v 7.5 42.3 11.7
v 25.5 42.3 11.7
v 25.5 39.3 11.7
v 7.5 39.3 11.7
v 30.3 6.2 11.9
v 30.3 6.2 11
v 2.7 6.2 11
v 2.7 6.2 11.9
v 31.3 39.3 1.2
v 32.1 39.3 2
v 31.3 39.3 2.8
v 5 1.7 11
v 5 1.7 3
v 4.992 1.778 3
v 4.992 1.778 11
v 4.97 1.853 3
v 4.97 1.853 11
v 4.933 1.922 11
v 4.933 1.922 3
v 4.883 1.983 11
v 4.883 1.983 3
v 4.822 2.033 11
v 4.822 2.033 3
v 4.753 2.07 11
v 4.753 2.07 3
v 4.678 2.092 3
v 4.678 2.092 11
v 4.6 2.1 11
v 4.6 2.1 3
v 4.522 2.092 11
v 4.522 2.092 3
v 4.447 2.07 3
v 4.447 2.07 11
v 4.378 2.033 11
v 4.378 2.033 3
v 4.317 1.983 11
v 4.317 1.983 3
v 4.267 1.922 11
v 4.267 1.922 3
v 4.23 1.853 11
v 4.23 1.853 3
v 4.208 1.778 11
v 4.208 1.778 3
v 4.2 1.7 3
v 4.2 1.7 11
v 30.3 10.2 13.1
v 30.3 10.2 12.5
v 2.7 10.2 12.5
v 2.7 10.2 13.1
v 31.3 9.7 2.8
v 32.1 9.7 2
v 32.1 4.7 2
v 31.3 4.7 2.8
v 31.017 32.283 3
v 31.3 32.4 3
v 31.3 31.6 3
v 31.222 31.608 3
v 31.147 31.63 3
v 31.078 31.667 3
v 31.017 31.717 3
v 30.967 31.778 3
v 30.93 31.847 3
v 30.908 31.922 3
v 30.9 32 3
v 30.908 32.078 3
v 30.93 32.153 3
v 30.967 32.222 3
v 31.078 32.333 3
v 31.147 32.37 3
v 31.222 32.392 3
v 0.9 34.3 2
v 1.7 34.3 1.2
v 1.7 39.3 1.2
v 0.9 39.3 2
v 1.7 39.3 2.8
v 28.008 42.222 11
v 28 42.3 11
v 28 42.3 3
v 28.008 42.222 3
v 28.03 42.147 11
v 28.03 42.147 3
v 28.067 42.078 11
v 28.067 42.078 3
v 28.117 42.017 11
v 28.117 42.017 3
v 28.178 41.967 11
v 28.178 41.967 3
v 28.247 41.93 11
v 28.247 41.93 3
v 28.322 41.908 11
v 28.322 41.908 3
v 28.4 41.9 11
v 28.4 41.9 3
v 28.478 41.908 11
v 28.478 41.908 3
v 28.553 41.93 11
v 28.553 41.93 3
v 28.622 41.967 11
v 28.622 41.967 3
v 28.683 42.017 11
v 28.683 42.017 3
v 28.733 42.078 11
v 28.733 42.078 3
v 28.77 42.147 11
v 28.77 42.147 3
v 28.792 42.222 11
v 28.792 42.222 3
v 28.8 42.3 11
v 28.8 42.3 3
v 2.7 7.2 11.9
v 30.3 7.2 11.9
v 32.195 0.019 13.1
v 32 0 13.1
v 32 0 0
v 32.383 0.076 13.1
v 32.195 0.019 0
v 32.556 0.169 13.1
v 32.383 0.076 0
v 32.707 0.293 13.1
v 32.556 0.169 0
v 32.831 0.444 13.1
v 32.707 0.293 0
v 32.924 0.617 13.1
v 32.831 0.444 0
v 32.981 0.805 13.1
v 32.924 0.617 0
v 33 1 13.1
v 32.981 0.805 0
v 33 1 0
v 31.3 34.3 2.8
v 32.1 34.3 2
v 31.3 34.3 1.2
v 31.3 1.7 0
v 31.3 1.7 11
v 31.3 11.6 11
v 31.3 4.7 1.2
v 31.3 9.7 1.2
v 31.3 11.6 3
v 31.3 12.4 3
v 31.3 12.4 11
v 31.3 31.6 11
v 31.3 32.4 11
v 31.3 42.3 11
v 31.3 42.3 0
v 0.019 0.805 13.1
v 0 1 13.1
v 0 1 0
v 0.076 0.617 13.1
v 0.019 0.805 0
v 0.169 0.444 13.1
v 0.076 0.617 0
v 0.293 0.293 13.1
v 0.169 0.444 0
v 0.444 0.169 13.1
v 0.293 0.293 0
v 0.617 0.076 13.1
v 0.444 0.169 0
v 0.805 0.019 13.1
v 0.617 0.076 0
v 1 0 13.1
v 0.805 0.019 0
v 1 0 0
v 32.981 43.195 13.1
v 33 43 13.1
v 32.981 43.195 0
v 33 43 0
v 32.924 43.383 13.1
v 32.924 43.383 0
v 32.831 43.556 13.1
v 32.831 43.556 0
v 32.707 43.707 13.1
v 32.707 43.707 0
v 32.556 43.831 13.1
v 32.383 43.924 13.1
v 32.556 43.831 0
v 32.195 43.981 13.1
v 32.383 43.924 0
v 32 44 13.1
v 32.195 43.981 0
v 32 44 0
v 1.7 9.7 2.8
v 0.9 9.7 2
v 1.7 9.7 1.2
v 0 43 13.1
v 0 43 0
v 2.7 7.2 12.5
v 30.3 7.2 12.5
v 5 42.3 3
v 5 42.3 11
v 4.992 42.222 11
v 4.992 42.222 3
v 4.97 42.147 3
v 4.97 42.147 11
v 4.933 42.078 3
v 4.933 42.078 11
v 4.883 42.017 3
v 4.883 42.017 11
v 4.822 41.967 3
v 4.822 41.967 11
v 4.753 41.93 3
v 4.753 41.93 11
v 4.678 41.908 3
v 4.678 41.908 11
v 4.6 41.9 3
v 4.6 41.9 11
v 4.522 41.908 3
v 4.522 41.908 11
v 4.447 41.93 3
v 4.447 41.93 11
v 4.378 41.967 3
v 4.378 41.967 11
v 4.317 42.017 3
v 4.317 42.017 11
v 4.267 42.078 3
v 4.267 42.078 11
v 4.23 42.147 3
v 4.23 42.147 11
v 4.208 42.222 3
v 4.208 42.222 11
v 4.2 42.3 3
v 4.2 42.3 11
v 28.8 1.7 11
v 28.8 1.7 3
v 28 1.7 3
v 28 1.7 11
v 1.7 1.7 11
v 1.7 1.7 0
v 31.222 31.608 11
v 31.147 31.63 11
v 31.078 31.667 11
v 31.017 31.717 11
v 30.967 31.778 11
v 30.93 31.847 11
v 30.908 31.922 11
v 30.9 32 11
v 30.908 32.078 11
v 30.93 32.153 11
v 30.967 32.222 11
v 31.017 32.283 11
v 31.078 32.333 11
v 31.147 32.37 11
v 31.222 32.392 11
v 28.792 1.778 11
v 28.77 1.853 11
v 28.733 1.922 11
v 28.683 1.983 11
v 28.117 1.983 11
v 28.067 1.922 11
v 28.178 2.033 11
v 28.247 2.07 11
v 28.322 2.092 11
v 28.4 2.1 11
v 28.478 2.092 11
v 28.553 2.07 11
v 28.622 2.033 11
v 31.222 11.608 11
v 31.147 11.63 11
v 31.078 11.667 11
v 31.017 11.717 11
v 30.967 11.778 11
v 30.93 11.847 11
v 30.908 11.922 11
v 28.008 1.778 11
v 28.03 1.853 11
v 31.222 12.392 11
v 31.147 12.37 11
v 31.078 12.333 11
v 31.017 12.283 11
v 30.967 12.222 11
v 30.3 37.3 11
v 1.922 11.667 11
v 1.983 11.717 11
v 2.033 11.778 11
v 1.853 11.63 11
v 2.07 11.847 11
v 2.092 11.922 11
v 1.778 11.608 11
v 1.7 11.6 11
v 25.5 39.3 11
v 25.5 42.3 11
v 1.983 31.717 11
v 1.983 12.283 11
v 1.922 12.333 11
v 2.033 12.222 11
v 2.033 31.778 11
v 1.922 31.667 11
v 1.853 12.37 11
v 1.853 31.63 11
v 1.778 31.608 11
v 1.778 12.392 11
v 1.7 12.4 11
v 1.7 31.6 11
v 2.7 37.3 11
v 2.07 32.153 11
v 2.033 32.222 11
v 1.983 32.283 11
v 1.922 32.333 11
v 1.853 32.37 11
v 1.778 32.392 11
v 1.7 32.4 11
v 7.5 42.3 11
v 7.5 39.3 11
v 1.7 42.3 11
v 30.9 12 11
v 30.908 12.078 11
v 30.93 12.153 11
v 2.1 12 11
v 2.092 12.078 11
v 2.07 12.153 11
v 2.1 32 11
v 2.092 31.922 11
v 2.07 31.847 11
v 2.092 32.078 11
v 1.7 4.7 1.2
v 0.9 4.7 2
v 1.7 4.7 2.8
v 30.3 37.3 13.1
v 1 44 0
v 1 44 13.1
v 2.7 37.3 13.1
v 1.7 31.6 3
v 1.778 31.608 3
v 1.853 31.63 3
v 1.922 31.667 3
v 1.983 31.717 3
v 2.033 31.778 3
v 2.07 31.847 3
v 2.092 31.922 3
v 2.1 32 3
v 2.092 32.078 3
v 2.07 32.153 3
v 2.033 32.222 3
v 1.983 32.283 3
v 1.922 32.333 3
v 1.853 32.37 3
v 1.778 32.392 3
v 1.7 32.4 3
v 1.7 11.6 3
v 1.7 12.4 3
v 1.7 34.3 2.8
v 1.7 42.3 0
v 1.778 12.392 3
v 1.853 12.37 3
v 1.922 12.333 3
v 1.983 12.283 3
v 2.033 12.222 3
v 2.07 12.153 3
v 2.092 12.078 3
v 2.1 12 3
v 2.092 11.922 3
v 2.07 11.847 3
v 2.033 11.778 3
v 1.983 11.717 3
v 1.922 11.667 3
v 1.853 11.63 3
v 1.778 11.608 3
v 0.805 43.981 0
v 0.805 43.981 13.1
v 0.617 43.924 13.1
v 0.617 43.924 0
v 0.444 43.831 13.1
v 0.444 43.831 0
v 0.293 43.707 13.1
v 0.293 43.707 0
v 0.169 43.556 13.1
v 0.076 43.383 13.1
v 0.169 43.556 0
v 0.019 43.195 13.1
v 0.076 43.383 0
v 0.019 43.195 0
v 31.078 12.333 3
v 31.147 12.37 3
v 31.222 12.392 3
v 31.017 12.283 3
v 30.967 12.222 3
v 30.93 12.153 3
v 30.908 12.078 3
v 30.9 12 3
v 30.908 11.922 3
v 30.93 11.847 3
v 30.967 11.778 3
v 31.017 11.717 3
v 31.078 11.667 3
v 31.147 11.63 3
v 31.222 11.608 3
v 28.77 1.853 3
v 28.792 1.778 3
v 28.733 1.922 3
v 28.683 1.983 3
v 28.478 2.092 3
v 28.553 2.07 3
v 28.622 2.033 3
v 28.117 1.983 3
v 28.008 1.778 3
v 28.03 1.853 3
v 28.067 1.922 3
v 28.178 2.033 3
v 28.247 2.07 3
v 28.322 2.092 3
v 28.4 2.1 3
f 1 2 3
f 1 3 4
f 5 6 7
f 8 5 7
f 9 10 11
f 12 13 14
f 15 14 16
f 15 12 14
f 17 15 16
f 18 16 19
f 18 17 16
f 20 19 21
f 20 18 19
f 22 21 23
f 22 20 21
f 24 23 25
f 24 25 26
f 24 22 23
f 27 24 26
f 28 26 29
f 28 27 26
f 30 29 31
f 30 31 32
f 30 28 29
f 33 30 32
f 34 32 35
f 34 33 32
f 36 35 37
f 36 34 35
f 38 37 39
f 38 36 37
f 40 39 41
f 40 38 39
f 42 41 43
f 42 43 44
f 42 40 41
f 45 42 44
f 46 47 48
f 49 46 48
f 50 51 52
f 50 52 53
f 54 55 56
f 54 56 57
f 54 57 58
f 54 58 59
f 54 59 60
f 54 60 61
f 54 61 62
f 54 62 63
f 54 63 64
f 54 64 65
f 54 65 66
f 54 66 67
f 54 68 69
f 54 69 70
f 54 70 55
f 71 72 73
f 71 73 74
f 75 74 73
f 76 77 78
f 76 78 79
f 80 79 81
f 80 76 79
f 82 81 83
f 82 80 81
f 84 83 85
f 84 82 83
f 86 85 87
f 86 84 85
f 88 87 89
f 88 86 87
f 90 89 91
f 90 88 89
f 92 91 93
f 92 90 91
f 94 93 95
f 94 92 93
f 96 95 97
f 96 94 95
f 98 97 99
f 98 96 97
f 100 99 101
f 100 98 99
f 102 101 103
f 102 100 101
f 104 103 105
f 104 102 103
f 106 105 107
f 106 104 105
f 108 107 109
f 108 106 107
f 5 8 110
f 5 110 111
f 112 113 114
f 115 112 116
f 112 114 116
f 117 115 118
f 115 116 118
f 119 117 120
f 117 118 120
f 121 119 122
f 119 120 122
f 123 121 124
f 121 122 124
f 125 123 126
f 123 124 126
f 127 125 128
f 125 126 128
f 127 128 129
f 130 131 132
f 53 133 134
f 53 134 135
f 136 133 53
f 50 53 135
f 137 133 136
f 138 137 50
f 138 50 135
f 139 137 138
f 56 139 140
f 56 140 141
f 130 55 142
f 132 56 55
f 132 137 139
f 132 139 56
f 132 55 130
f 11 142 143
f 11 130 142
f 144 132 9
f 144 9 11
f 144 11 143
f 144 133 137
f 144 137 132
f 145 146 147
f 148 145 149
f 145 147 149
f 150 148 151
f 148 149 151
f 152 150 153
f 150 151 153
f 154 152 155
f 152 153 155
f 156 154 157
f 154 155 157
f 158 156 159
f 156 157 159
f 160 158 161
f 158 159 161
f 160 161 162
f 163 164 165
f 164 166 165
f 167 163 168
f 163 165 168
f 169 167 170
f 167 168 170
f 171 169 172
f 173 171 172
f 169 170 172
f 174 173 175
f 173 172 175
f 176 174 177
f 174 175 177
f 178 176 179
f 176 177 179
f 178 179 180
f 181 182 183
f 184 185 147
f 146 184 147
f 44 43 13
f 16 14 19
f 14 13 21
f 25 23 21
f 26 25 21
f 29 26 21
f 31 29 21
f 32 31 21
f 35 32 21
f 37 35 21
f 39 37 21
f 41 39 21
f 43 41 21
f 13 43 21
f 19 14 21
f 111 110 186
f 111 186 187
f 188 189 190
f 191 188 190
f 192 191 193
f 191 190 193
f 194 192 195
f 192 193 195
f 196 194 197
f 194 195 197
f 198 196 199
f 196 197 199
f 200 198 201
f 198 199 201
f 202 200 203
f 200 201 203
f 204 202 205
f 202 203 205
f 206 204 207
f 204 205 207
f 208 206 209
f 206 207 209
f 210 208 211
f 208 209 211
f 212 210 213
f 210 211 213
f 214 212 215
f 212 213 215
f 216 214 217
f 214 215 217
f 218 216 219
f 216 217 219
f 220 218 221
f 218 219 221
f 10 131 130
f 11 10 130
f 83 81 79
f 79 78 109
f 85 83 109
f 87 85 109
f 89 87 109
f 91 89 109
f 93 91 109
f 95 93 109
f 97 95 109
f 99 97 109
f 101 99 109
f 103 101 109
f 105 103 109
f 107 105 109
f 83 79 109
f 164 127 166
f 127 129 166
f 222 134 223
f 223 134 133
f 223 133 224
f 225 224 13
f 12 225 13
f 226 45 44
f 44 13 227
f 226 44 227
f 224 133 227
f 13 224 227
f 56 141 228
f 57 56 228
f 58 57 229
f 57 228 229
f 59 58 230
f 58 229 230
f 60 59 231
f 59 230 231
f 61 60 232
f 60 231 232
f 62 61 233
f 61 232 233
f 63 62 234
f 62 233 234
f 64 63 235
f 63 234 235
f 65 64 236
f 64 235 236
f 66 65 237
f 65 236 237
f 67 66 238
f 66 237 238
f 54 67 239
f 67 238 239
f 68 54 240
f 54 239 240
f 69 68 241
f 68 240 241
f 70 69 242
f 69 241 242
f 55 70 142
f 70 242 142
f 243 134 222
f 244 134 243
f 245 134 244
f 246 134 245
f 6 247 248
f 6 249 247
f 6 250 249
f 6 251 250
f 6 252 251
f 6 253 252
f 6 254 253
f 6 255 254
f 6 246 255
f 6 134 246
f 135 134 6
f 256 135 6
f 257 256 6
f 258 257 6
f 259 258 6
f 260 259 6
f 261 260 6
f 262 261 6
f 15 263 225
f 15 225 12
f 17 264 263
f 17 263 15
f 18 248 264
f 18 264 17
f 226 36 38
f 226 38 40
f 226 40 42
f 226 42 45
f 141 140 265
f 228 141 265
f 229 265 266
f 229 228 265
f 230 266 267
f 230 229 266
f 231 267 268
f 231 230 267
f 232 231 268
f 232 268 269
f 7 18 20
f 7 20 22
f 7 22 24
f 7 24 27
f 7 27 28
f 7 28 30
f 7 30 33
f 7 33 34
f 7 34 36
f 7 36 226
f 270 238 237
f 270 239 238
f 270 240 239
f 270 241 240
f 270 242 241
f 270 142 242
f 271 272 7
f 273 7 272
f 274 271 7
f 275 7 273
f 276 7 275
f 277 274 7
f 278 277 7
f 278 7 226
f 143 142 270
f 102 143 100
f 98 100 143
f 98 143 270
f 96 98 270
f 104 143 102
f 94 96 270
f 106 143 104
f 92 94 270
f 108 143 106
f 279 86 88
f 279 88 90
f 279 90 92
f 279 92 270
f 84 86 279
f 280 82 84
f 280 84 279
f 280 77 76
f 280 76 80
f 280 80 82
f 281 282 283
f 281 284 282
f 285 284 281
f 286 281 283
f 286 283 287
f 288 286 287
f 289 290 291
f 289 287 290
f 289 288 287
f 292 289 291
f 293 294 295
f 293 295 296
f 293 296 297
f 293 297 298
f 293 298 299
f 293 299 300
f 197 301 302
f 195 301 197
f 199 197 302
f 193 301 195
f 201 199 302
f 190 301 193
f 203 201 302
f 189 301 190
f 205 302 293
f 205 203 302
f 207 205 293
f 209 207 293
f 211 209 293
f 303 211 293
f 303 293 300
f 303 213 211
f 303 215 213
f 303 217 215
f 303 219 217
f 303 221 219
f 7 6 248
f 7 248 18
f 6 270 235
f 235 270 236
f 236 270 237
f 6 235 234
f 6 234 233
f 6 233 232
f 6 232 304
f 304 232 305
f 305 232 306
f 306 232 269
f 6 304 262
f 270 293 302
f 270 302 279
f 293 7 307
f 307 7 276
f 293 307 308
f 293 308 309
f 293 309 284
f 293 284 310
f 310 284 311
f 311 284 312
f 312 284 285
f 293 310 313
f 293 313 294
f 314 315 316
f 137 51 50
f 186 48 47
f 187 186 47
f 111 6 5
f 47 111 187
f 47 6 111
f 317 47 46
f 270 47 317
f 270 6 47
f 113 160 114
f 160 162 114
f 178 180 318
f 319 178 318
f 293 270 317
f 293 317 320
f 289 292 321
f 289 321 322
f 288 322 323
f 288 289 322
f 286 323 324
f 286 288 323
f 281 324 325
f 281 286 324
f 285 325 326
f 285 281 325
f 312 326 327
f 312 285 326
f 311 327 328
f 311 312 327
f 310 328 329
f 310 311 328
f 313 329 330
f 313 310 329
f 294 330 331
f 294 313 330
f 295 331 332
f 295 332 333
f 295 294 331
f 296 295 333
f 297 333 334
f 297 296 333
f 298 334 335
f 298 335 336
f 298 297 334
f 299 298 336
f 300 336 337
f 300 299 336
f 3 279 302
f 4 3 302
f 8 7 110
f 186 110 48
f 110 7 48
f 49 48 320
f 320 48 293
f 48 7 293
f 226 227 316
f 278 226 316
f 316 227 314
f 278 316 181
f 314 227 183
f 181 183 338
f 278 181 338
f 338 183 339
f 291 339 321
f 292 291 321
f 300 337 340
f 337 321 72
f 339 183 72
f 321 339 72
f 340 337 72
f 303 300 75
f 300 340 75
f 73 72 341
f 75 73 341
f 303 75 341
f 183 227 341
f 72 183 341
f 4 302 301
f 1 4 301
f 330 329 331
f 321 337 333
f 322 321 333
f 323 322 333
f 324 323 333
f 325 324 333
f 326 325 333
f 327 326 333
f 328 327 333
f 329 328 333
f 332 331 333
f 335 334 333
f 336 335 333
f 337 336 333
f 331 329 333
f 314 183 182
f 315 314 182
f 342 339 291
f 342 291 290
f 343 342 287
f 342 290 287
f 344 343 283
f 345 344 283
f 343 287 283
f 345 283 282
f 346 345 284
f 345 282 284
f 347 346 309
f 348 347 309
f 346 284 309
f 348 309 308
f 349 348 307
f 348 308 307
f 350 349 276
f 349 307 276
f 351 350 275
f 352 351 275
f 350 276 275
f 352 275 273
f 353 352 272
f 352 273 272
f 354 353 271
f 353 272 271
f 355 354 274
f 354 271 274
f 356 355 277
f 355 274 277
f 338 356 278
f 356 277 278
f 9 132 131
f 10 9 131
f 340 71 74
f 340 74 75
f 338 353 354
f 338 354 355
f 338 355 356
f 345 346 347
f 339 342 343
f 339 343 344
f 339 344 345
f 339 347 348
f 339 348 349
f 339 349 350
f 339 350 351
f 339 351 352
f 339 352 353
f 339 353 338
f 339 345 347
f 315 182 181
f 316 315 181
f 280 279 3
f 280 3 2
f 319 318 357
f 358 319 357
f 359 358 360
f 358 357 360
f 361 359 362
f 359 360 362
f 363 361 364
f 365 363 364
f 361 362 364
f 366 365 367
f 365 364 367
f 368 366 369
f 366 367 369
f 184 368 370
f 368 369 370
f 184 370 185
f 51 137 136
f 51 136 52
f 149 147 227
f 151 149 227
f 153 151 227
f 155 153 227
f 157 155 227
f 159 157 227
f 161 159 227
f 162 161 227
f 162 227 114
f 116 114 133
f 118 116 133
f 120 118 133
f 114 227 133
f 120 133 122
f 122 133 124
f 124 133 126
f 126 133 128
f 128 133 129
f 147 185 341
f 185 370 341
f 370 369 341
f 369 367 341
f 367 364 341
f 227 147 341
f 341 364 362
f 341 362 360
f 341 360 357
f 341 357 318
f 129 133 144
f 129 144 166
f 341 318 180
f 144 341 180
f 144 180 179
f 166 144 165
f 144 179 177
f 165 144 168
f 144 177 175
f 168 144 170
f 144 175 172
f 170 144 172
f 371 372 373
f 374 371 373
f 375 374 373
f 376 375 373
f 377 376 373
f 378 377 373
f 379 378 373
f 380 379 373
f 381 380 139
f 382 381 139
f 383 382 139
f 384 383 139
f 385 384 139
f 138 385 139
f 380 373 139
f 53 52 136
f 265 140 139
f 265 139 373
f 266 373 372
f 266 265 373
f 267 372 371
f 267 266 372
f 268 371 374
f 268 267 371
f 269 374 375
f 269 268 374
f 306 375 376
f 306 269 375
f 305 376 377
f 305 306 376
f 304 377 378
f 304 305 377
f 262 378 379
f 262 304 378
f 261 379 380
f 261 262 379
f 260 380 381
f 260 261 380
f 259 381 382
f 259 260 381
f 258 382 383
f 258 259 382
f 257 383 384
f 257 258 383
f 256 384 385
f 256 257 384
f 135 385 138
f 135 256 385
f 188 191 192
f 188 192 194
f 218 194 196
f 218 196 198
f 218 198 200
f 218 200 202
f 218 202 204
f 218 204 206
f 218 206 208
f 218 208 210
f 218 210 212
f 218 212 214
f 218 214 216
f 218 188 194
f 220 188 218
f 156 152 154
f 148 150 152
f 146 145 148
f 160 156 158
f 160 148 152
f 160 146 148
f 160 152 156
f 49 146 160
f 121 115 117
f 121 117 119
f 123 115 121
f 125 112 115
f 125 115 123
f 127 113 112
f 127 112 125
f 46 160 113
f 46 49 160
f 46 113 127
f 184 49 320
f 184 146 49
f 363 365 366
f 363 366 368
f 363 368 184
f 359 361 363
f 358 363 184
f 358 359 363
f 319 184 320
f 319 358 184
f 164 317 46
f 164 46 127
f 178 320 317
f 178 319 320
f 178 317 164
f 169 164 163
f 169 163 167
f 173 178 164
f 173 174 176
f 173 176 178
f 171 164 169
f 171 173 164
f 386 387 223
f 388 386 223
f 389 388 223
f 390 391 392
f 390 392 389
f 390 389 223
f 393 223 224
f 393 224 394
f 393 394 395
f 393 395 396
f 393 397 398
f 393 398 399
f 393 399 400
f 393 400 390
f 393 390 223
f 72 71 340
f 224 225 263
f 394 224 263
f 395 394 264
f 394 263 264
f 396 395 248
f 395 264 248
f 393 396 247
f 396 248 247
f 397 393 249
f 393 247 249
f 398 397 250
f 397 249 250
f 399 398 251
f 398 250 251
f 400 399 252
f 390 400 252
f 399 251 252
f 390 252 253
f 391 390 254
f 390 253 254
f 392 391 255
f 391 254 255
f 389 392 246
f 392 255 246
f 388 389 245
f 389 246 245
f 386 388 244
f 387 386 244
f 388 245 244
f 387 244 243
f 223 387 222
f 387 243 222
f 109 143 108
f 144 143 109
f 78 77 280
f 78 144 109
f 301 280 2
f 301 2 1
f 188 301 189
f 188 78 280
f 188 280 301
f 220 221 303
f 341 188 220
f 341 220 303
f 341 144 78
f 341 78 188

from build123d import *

# Parameters (mm, degrees)
SKETCH_1_W          = 33
SKETCH_1_H          = 44
EXTRUDE_1_DEPTH     = 12.5
SKETCH_2_W          = 29.6
SKETCH_2_H          = 40.6
CUT_EXTRUDE_2_DEPTH = 11
SKETCH_3_W          = 27.6
SKETCH_3_H          = 31.1
CUT_EXTRUDE_3_DEPTH = 2.5
SKETCH_4_W          = 18
SKETCH_4_H          = 3
CUT_EXTRUDE_4_DEPTH = 0.7
FILLET_1_R          = 1
SKETCH_5_W          = 27.6
SKETCH_5_H          = 0.6
EXTRUDE_2_DEPTH     = 1
EXTRUDE_3_DEPTH     = 8
EXTRUDE_4_DEPTH     = 0.6
SKETCH_8_W          = 27.6
SKETCH_8_H          = 27.1
CUT_EXTRUDE_5_DEPTH = 1.6
CUT_EXTRUDE_6_DEPTH = 5


with BuildPart() as part:
    # 草图1 → 凸台-拉伸1 (new body)
    with BuildSketch(Plane.XY):
        with Locations((16.5, 22)):
            Rectangle(SKETCH_1_W, SKETCH_1_H)
    extrude(amount=EXTRUDE_1_DEPTH)

    # 草图2 → 切除-拉伸2 (cut)
    with BuildSketch(Plane(origin=(0, 0, 0), x_dir=(-1, 0, 0), z_dir=(0, 0, -1))):
        with Locations((-16.5, 22)):
            Rectangle(SKETCH_2_W, SKETCH_2_H)
    extrude(amount=-CUT_EXTRUDE_2_DEPTH, mode=Mode.SUBTRACT)

    # 草图3 → 切除-拉伸3 (cut, through all)
    with BuildSketch(Plane(origin=(0, 0, 11), x_dir=(-1, 0, 0), z_dir=(0, 0, -1))):
        with Locations((-16.5, 21.75)):
            Rectangle(SKETCH_3_W, SKETCH_3_H)
    extrude(amount=-CUT_EXTRUDE_3_DEPTH, mode=Mode.SUBTRACT)

    # 草图4 → 切除-拉伸4 (cut)
    with BuildSketch(Plane(origin=(0, 0, 11), x_dir=(-1, 0, 0), z_dir=(0, 0, -1))):
        with Locations((-16.5, 40.8)):
            Rectangle(SKETCH_4_W, SKETCH_4_H)
    extrude(amount=-CUT_EXTRUDE_4_DEPTH, mode=Mode.SUBTRACT)

    # 圆角1
    fillet_1_edges = [part.edges().sort_by_distance(p)[0] for p in [
        (0, 44, 6.25),
        (33, 44, 6.25),
        (33, 0, 6.25),
        (0, 0, 6.25),
    ]]
    fillet(fillet_1_edges, radius=FILLET_1_R)

    # 草图5 → 凸台-拉伸2 (add)
    with BuildSketch(Plane(origin=(0, 6.2, 0), x_dir=(1, 0, 0), z_dir=(0, 1, 0))):
        with Locations((16.5, -12.2)):
            Rectangle(SKETCH_5_W, SKETCH_5_H)
    extrude(amount=EXTRUDE_2_DEPTH)

    # 草图6 → 凸台-拉伸3 (add)
    with BuildSketch(Plane(origin=(0, 0, 11), x_dir=(-1, 0, 0), z_dir=(0, 0, -1))):
        with BuildLine():
            Line((-31.3, 11.6), (-31.3, 12.4))
            ThreePointArc((-31.3, 12.4), (-30.9, 12), (-31.3, 11.6))
        make_face()
        with BuildLine():
            Line((-31.3, 32.4), (-31.3, 31.6))
            ThreePointArc((-31.3, 31.6), (-30.9, 32), (-31.3, 32.4))
        make_face()
        with BuildLine():
            Line((-28.8, 42.3), (-28, 42.3))
            ThreePointArc((-28, 42.3), (-28.4, 41.9), (-28.8, 42.3))
        make_face()
        with BuildLine():
            Line((-28.8, 1.7), (-28, 1.7))
            ThreePointArc((-28, 1.7), (-28.4, 2.1), (-28.8, 1.7))
        make_face()
        with BuildLine():
            Line((-4.2, 1.7), (-5, 1.7))
            ThreePointArc((-5, 1.7), (-4.6, 2.1), (-4.2, 1.7))
        make_face()
        with BuildLine():
            Line((-4.2, 42.3), (-5, 42.3))
            ThreePointArc((-5, 42.3), (-4.6, 41.9), (-4.2, 42.3))
        make_face()
        with BuildLine():
            Line((-1.7, 32.4), (-1.7, 31.6))
            ThreePointArc((-1.7, 31.6), (-2.1, 32), (-1.7, 32.4))
        make_face()
        with BuildLine():
            Line((-1.7, 11.6), (-1.7, 12.4))
            ThreePointArc((-1.7, 12.4), (-2.1, 12), (-1.7, 11.6))
        make_face()
    extrude(amount=EXTRUDE_3_DEPTH)

    # 草图7 → 凸台-拉伸4 (add)
    with BuildSketch(Plane.XY.offset(12.5)):
        with BuildLine():
            Line((0, 43), (0, 1))
            ThreePointArc((0, 1), (0.292893219, 0.292893219), (1, 0))
            Line((1, 0), (32, 0))
            ThreePointArc((32, 0), (32.707106781, 0.292893219), (33, 1))
            Line((33, 1), (33, 43))
            ThreePointArc((33, 43), (32.707106781, 43.707106781), (32, 44))
            Line((32, 44), (1, 44))
            ThreePointArc((1, 44), (0.292893219, 43.707106781), (0, 43))
        make_face()
    extrude(amount=EXTRUDE_4_DEPTH)

    # 草图8 → 切除-拉伸5 (cut, through all)
    with BuildSketch(Plane(origin=(0, 0, 12.5), x_dir=(-1, 0, 0), z_dir=(0, 0, -1))):
        with Locations((-16.5, 23.75)):
            Rectangle(SKETCH_8_W, SKETCH_8_H)
    extrude(amount=-CUT_EXTRUDE_5_DEPTH, mode=Mode.SUBTRACT)

    # 草图9 → 切除-拉伸6 (cut)
    with BuildSketch(Plane(origin=(0, 34.3, 0), x_dir=(-1, 0, 0), z_dir=(0, -1, 0))):
        Polygon((-31.3, -1.2), (-32.1, -2), (-31.3, -2.8), align=None)
        Polygon((-1.7, -2.8), (-1.7, -1.2), (-0.9, -2), align=None)
    cut_extrude_6 = extrude(amount=-CUT_EXTRUDE_6_DEPTH, mode=Mode.SUBTRACT)

    # 镜向1: 切除-拉伸6 across plane
    add(cut_extrude_6.mirror(Plane(origin=(0, 22, 0), x_dir=(0, 0, 1), z_dir=(0, -1, 0))), mode=Mode.SUBTRACT)


solid = part.part
